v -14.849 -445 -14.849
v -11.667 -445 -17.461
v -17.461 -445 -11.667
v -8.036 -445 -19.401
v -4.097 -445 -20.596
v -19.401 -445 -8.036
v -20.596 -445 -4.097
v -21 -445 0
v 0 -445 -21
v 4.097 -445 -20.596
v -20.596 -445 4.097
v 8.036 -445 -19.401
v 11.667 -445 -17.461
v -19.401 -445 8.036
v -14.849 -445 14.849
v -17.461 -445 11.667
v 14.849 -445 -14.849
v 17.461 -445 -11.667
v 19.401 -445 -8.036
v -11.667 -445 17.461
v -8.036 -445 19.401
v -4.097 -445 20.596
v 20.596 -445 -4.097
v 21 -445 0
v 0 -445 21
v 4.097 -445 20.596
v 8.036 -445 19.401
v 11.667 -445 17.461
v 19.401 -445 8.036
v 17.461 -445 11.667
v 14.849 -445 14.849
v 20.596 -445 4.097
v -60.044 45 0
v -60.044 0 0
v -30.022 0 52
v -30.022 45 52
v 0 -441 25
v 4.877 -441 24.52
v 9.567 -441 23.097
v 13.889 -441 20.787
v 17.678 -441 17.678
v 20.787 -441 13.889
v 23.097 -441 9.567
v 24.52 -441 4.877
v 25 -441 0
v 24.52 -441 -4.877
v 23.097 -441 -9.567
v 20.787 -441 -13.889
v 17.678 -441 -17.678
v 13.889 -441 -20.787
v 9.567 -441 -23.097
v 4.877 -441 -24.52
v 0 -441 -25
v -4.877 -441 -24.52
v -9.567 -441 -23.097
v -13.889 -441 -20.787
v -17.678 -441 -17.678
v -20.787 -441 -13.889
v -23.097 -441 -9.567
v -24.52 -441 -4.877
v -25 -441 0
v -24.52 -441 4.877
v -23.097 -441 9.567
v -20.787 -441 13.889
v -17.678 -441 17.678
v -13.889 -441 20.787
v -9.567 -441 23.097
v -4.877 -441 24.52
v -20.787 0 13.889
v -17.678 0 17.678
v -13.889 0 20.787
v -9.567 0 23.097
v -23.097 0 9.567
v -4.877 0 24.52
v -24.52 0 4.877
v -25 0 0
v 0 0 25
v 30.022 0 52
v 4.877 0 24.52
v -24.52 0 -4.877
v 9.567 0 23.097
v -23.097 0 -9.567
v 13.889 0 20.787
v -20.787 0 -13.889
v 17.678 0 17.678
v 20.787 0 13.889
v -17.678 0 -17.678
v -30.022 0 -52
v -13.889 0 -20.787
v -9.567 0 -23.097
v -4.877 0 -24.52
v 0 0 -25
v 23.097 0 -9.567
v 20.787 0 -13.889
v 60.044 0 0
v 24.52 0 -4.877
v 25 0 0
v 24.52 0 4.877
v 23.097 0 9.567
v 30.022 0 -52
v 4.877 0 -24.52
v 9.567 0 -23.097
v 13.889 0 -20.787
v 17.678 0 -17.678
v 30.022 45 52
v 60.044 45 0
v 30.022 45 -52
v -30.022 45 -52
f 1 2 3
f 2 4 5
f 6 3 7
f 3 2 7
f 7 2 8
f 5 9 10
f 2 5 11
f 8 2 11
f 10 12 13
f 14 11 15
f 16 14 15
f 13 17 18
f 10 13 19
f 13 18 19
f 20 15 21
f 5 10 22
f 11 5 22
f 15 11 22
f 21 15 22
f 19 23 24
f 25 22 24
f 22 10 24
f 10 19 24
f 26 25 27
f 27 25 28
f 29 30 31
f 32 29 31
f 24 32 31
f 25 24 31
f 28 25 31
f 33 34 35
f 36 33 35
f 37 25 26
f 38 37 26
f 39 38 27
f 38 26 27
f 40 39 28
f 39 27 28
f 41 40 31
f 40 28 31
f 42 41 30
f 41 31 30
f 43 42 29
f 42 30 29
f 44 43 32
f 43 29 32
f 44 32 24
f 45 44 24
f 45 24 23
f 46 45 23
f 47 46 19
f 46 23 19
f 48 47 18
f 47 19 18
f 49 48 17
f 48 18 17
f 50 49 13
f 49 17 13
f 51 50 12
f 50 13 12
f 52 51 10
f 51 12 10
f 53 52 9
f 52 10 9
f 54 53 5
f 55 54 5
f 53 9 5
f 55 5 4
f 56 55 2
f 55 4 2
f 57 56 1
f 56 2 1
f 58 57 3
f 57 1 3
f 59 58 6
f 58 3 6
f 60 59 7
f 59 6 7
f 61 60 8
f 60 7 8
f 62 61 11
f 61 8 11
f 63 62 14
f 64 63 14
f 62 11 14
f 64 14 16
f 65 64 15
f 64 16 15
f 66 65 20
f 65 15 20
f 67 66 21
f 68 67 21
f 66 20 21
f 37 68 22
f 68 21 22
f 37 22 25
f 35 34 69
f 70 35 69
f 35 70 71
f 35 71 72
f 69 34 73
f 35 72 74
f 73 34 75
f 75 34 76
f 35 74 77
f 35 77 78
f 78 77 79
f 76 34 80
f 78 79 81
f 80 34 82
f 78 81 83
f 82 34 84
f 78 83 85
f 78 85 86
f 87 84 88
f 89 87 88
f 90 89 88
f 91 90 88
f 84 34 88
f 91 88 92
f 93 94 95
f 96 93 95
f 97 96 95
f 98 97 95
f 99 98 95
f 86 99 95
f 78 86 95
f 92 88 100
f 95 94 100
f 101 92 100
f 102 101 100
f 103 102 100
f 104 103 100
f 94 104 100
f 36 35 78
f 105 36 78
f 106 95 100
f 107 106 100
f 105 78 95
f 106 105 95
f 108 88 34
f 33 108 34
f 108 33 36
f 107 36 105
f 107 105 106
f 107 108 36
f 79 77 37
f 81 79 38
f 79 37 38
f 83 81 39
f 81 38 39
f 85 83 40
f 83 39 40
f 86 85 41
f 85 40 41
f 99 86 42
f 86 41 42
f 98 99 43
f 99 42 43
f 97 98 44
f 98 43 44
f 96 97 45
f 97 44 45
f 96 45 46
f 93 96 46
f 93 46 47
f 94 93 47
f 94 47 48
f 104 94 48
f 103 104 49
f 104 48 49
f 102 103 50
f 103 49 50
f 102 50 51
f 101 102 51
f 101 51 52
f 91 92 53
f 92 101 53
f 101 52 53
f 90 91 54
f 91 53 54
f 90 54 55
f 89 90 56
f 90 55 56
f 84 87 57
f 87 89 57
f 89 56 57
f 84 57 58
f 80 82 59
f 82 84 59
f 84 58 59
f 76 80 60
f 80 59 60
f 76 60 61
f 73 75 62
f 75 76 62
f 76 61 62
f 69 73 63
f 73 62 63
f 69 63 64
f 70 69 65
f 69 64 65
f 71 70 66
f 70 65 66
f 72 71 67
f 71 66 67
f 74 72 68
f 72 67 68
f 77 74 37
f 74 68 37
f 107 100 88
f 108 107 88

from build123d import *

# Parameters (mm, degrees)
SKETCH2_R                = 25
BOSS_EXTRUDE1_DEPTH      = 45
BOSS_EXTRUDE2_DEPTH      = 45
BOSS_EXTRUDE2_DEPTH_BACK = 445
SKETCH2_3_R              = 25
CHAMFER1_SIZE            = 4


with BuildPart() as part:
    # Sketch2 → Boss-Extrude1 (new body)
    with BuildSketch(Plane(origin=(0, 0, 0), x_dir=(1, 0, 0), z_dir=(0, 1, 0))):
        Polygon((60.044427996, 0), (30.022213998, 52), (-30.022213998, 52), (-60.044427996, 0), (-30.022213998, -52), (30.022213998, -52), align=None)
        Circle(SKETCH2_R, mode=Mode.SUBTRACT)
    extrude(amount=BOSS_EXTRUDE1_DEPTH)

    # Sketch2<3> → Boss-Extrude2 (add, two sides: drawn at the far end of the back side and taken through both)
    with BuildSketch(Plane(origin=(0, 0, 0), x_dir=(1, 0, 0), z_dir=(0, 1, 0)).offset(-BOSS_EXTRUDE2_DEPTH_BACK)):
        Circle(SKETCH2_3_R)
    extrude(amount=BOSS_EXTRUDE2_DEPTH + BOSS_EXTRUDE2_DEPTH_BACK)

    # Chamfer1
    chamfer1_edges = [part.edges().sort_by_distance(p)[0] for p in [
        (-25, -445, 0),
    ]]
    chamfer(chamfer1_edges, length=CHAMFER1_SIZE)


solid = part.part
